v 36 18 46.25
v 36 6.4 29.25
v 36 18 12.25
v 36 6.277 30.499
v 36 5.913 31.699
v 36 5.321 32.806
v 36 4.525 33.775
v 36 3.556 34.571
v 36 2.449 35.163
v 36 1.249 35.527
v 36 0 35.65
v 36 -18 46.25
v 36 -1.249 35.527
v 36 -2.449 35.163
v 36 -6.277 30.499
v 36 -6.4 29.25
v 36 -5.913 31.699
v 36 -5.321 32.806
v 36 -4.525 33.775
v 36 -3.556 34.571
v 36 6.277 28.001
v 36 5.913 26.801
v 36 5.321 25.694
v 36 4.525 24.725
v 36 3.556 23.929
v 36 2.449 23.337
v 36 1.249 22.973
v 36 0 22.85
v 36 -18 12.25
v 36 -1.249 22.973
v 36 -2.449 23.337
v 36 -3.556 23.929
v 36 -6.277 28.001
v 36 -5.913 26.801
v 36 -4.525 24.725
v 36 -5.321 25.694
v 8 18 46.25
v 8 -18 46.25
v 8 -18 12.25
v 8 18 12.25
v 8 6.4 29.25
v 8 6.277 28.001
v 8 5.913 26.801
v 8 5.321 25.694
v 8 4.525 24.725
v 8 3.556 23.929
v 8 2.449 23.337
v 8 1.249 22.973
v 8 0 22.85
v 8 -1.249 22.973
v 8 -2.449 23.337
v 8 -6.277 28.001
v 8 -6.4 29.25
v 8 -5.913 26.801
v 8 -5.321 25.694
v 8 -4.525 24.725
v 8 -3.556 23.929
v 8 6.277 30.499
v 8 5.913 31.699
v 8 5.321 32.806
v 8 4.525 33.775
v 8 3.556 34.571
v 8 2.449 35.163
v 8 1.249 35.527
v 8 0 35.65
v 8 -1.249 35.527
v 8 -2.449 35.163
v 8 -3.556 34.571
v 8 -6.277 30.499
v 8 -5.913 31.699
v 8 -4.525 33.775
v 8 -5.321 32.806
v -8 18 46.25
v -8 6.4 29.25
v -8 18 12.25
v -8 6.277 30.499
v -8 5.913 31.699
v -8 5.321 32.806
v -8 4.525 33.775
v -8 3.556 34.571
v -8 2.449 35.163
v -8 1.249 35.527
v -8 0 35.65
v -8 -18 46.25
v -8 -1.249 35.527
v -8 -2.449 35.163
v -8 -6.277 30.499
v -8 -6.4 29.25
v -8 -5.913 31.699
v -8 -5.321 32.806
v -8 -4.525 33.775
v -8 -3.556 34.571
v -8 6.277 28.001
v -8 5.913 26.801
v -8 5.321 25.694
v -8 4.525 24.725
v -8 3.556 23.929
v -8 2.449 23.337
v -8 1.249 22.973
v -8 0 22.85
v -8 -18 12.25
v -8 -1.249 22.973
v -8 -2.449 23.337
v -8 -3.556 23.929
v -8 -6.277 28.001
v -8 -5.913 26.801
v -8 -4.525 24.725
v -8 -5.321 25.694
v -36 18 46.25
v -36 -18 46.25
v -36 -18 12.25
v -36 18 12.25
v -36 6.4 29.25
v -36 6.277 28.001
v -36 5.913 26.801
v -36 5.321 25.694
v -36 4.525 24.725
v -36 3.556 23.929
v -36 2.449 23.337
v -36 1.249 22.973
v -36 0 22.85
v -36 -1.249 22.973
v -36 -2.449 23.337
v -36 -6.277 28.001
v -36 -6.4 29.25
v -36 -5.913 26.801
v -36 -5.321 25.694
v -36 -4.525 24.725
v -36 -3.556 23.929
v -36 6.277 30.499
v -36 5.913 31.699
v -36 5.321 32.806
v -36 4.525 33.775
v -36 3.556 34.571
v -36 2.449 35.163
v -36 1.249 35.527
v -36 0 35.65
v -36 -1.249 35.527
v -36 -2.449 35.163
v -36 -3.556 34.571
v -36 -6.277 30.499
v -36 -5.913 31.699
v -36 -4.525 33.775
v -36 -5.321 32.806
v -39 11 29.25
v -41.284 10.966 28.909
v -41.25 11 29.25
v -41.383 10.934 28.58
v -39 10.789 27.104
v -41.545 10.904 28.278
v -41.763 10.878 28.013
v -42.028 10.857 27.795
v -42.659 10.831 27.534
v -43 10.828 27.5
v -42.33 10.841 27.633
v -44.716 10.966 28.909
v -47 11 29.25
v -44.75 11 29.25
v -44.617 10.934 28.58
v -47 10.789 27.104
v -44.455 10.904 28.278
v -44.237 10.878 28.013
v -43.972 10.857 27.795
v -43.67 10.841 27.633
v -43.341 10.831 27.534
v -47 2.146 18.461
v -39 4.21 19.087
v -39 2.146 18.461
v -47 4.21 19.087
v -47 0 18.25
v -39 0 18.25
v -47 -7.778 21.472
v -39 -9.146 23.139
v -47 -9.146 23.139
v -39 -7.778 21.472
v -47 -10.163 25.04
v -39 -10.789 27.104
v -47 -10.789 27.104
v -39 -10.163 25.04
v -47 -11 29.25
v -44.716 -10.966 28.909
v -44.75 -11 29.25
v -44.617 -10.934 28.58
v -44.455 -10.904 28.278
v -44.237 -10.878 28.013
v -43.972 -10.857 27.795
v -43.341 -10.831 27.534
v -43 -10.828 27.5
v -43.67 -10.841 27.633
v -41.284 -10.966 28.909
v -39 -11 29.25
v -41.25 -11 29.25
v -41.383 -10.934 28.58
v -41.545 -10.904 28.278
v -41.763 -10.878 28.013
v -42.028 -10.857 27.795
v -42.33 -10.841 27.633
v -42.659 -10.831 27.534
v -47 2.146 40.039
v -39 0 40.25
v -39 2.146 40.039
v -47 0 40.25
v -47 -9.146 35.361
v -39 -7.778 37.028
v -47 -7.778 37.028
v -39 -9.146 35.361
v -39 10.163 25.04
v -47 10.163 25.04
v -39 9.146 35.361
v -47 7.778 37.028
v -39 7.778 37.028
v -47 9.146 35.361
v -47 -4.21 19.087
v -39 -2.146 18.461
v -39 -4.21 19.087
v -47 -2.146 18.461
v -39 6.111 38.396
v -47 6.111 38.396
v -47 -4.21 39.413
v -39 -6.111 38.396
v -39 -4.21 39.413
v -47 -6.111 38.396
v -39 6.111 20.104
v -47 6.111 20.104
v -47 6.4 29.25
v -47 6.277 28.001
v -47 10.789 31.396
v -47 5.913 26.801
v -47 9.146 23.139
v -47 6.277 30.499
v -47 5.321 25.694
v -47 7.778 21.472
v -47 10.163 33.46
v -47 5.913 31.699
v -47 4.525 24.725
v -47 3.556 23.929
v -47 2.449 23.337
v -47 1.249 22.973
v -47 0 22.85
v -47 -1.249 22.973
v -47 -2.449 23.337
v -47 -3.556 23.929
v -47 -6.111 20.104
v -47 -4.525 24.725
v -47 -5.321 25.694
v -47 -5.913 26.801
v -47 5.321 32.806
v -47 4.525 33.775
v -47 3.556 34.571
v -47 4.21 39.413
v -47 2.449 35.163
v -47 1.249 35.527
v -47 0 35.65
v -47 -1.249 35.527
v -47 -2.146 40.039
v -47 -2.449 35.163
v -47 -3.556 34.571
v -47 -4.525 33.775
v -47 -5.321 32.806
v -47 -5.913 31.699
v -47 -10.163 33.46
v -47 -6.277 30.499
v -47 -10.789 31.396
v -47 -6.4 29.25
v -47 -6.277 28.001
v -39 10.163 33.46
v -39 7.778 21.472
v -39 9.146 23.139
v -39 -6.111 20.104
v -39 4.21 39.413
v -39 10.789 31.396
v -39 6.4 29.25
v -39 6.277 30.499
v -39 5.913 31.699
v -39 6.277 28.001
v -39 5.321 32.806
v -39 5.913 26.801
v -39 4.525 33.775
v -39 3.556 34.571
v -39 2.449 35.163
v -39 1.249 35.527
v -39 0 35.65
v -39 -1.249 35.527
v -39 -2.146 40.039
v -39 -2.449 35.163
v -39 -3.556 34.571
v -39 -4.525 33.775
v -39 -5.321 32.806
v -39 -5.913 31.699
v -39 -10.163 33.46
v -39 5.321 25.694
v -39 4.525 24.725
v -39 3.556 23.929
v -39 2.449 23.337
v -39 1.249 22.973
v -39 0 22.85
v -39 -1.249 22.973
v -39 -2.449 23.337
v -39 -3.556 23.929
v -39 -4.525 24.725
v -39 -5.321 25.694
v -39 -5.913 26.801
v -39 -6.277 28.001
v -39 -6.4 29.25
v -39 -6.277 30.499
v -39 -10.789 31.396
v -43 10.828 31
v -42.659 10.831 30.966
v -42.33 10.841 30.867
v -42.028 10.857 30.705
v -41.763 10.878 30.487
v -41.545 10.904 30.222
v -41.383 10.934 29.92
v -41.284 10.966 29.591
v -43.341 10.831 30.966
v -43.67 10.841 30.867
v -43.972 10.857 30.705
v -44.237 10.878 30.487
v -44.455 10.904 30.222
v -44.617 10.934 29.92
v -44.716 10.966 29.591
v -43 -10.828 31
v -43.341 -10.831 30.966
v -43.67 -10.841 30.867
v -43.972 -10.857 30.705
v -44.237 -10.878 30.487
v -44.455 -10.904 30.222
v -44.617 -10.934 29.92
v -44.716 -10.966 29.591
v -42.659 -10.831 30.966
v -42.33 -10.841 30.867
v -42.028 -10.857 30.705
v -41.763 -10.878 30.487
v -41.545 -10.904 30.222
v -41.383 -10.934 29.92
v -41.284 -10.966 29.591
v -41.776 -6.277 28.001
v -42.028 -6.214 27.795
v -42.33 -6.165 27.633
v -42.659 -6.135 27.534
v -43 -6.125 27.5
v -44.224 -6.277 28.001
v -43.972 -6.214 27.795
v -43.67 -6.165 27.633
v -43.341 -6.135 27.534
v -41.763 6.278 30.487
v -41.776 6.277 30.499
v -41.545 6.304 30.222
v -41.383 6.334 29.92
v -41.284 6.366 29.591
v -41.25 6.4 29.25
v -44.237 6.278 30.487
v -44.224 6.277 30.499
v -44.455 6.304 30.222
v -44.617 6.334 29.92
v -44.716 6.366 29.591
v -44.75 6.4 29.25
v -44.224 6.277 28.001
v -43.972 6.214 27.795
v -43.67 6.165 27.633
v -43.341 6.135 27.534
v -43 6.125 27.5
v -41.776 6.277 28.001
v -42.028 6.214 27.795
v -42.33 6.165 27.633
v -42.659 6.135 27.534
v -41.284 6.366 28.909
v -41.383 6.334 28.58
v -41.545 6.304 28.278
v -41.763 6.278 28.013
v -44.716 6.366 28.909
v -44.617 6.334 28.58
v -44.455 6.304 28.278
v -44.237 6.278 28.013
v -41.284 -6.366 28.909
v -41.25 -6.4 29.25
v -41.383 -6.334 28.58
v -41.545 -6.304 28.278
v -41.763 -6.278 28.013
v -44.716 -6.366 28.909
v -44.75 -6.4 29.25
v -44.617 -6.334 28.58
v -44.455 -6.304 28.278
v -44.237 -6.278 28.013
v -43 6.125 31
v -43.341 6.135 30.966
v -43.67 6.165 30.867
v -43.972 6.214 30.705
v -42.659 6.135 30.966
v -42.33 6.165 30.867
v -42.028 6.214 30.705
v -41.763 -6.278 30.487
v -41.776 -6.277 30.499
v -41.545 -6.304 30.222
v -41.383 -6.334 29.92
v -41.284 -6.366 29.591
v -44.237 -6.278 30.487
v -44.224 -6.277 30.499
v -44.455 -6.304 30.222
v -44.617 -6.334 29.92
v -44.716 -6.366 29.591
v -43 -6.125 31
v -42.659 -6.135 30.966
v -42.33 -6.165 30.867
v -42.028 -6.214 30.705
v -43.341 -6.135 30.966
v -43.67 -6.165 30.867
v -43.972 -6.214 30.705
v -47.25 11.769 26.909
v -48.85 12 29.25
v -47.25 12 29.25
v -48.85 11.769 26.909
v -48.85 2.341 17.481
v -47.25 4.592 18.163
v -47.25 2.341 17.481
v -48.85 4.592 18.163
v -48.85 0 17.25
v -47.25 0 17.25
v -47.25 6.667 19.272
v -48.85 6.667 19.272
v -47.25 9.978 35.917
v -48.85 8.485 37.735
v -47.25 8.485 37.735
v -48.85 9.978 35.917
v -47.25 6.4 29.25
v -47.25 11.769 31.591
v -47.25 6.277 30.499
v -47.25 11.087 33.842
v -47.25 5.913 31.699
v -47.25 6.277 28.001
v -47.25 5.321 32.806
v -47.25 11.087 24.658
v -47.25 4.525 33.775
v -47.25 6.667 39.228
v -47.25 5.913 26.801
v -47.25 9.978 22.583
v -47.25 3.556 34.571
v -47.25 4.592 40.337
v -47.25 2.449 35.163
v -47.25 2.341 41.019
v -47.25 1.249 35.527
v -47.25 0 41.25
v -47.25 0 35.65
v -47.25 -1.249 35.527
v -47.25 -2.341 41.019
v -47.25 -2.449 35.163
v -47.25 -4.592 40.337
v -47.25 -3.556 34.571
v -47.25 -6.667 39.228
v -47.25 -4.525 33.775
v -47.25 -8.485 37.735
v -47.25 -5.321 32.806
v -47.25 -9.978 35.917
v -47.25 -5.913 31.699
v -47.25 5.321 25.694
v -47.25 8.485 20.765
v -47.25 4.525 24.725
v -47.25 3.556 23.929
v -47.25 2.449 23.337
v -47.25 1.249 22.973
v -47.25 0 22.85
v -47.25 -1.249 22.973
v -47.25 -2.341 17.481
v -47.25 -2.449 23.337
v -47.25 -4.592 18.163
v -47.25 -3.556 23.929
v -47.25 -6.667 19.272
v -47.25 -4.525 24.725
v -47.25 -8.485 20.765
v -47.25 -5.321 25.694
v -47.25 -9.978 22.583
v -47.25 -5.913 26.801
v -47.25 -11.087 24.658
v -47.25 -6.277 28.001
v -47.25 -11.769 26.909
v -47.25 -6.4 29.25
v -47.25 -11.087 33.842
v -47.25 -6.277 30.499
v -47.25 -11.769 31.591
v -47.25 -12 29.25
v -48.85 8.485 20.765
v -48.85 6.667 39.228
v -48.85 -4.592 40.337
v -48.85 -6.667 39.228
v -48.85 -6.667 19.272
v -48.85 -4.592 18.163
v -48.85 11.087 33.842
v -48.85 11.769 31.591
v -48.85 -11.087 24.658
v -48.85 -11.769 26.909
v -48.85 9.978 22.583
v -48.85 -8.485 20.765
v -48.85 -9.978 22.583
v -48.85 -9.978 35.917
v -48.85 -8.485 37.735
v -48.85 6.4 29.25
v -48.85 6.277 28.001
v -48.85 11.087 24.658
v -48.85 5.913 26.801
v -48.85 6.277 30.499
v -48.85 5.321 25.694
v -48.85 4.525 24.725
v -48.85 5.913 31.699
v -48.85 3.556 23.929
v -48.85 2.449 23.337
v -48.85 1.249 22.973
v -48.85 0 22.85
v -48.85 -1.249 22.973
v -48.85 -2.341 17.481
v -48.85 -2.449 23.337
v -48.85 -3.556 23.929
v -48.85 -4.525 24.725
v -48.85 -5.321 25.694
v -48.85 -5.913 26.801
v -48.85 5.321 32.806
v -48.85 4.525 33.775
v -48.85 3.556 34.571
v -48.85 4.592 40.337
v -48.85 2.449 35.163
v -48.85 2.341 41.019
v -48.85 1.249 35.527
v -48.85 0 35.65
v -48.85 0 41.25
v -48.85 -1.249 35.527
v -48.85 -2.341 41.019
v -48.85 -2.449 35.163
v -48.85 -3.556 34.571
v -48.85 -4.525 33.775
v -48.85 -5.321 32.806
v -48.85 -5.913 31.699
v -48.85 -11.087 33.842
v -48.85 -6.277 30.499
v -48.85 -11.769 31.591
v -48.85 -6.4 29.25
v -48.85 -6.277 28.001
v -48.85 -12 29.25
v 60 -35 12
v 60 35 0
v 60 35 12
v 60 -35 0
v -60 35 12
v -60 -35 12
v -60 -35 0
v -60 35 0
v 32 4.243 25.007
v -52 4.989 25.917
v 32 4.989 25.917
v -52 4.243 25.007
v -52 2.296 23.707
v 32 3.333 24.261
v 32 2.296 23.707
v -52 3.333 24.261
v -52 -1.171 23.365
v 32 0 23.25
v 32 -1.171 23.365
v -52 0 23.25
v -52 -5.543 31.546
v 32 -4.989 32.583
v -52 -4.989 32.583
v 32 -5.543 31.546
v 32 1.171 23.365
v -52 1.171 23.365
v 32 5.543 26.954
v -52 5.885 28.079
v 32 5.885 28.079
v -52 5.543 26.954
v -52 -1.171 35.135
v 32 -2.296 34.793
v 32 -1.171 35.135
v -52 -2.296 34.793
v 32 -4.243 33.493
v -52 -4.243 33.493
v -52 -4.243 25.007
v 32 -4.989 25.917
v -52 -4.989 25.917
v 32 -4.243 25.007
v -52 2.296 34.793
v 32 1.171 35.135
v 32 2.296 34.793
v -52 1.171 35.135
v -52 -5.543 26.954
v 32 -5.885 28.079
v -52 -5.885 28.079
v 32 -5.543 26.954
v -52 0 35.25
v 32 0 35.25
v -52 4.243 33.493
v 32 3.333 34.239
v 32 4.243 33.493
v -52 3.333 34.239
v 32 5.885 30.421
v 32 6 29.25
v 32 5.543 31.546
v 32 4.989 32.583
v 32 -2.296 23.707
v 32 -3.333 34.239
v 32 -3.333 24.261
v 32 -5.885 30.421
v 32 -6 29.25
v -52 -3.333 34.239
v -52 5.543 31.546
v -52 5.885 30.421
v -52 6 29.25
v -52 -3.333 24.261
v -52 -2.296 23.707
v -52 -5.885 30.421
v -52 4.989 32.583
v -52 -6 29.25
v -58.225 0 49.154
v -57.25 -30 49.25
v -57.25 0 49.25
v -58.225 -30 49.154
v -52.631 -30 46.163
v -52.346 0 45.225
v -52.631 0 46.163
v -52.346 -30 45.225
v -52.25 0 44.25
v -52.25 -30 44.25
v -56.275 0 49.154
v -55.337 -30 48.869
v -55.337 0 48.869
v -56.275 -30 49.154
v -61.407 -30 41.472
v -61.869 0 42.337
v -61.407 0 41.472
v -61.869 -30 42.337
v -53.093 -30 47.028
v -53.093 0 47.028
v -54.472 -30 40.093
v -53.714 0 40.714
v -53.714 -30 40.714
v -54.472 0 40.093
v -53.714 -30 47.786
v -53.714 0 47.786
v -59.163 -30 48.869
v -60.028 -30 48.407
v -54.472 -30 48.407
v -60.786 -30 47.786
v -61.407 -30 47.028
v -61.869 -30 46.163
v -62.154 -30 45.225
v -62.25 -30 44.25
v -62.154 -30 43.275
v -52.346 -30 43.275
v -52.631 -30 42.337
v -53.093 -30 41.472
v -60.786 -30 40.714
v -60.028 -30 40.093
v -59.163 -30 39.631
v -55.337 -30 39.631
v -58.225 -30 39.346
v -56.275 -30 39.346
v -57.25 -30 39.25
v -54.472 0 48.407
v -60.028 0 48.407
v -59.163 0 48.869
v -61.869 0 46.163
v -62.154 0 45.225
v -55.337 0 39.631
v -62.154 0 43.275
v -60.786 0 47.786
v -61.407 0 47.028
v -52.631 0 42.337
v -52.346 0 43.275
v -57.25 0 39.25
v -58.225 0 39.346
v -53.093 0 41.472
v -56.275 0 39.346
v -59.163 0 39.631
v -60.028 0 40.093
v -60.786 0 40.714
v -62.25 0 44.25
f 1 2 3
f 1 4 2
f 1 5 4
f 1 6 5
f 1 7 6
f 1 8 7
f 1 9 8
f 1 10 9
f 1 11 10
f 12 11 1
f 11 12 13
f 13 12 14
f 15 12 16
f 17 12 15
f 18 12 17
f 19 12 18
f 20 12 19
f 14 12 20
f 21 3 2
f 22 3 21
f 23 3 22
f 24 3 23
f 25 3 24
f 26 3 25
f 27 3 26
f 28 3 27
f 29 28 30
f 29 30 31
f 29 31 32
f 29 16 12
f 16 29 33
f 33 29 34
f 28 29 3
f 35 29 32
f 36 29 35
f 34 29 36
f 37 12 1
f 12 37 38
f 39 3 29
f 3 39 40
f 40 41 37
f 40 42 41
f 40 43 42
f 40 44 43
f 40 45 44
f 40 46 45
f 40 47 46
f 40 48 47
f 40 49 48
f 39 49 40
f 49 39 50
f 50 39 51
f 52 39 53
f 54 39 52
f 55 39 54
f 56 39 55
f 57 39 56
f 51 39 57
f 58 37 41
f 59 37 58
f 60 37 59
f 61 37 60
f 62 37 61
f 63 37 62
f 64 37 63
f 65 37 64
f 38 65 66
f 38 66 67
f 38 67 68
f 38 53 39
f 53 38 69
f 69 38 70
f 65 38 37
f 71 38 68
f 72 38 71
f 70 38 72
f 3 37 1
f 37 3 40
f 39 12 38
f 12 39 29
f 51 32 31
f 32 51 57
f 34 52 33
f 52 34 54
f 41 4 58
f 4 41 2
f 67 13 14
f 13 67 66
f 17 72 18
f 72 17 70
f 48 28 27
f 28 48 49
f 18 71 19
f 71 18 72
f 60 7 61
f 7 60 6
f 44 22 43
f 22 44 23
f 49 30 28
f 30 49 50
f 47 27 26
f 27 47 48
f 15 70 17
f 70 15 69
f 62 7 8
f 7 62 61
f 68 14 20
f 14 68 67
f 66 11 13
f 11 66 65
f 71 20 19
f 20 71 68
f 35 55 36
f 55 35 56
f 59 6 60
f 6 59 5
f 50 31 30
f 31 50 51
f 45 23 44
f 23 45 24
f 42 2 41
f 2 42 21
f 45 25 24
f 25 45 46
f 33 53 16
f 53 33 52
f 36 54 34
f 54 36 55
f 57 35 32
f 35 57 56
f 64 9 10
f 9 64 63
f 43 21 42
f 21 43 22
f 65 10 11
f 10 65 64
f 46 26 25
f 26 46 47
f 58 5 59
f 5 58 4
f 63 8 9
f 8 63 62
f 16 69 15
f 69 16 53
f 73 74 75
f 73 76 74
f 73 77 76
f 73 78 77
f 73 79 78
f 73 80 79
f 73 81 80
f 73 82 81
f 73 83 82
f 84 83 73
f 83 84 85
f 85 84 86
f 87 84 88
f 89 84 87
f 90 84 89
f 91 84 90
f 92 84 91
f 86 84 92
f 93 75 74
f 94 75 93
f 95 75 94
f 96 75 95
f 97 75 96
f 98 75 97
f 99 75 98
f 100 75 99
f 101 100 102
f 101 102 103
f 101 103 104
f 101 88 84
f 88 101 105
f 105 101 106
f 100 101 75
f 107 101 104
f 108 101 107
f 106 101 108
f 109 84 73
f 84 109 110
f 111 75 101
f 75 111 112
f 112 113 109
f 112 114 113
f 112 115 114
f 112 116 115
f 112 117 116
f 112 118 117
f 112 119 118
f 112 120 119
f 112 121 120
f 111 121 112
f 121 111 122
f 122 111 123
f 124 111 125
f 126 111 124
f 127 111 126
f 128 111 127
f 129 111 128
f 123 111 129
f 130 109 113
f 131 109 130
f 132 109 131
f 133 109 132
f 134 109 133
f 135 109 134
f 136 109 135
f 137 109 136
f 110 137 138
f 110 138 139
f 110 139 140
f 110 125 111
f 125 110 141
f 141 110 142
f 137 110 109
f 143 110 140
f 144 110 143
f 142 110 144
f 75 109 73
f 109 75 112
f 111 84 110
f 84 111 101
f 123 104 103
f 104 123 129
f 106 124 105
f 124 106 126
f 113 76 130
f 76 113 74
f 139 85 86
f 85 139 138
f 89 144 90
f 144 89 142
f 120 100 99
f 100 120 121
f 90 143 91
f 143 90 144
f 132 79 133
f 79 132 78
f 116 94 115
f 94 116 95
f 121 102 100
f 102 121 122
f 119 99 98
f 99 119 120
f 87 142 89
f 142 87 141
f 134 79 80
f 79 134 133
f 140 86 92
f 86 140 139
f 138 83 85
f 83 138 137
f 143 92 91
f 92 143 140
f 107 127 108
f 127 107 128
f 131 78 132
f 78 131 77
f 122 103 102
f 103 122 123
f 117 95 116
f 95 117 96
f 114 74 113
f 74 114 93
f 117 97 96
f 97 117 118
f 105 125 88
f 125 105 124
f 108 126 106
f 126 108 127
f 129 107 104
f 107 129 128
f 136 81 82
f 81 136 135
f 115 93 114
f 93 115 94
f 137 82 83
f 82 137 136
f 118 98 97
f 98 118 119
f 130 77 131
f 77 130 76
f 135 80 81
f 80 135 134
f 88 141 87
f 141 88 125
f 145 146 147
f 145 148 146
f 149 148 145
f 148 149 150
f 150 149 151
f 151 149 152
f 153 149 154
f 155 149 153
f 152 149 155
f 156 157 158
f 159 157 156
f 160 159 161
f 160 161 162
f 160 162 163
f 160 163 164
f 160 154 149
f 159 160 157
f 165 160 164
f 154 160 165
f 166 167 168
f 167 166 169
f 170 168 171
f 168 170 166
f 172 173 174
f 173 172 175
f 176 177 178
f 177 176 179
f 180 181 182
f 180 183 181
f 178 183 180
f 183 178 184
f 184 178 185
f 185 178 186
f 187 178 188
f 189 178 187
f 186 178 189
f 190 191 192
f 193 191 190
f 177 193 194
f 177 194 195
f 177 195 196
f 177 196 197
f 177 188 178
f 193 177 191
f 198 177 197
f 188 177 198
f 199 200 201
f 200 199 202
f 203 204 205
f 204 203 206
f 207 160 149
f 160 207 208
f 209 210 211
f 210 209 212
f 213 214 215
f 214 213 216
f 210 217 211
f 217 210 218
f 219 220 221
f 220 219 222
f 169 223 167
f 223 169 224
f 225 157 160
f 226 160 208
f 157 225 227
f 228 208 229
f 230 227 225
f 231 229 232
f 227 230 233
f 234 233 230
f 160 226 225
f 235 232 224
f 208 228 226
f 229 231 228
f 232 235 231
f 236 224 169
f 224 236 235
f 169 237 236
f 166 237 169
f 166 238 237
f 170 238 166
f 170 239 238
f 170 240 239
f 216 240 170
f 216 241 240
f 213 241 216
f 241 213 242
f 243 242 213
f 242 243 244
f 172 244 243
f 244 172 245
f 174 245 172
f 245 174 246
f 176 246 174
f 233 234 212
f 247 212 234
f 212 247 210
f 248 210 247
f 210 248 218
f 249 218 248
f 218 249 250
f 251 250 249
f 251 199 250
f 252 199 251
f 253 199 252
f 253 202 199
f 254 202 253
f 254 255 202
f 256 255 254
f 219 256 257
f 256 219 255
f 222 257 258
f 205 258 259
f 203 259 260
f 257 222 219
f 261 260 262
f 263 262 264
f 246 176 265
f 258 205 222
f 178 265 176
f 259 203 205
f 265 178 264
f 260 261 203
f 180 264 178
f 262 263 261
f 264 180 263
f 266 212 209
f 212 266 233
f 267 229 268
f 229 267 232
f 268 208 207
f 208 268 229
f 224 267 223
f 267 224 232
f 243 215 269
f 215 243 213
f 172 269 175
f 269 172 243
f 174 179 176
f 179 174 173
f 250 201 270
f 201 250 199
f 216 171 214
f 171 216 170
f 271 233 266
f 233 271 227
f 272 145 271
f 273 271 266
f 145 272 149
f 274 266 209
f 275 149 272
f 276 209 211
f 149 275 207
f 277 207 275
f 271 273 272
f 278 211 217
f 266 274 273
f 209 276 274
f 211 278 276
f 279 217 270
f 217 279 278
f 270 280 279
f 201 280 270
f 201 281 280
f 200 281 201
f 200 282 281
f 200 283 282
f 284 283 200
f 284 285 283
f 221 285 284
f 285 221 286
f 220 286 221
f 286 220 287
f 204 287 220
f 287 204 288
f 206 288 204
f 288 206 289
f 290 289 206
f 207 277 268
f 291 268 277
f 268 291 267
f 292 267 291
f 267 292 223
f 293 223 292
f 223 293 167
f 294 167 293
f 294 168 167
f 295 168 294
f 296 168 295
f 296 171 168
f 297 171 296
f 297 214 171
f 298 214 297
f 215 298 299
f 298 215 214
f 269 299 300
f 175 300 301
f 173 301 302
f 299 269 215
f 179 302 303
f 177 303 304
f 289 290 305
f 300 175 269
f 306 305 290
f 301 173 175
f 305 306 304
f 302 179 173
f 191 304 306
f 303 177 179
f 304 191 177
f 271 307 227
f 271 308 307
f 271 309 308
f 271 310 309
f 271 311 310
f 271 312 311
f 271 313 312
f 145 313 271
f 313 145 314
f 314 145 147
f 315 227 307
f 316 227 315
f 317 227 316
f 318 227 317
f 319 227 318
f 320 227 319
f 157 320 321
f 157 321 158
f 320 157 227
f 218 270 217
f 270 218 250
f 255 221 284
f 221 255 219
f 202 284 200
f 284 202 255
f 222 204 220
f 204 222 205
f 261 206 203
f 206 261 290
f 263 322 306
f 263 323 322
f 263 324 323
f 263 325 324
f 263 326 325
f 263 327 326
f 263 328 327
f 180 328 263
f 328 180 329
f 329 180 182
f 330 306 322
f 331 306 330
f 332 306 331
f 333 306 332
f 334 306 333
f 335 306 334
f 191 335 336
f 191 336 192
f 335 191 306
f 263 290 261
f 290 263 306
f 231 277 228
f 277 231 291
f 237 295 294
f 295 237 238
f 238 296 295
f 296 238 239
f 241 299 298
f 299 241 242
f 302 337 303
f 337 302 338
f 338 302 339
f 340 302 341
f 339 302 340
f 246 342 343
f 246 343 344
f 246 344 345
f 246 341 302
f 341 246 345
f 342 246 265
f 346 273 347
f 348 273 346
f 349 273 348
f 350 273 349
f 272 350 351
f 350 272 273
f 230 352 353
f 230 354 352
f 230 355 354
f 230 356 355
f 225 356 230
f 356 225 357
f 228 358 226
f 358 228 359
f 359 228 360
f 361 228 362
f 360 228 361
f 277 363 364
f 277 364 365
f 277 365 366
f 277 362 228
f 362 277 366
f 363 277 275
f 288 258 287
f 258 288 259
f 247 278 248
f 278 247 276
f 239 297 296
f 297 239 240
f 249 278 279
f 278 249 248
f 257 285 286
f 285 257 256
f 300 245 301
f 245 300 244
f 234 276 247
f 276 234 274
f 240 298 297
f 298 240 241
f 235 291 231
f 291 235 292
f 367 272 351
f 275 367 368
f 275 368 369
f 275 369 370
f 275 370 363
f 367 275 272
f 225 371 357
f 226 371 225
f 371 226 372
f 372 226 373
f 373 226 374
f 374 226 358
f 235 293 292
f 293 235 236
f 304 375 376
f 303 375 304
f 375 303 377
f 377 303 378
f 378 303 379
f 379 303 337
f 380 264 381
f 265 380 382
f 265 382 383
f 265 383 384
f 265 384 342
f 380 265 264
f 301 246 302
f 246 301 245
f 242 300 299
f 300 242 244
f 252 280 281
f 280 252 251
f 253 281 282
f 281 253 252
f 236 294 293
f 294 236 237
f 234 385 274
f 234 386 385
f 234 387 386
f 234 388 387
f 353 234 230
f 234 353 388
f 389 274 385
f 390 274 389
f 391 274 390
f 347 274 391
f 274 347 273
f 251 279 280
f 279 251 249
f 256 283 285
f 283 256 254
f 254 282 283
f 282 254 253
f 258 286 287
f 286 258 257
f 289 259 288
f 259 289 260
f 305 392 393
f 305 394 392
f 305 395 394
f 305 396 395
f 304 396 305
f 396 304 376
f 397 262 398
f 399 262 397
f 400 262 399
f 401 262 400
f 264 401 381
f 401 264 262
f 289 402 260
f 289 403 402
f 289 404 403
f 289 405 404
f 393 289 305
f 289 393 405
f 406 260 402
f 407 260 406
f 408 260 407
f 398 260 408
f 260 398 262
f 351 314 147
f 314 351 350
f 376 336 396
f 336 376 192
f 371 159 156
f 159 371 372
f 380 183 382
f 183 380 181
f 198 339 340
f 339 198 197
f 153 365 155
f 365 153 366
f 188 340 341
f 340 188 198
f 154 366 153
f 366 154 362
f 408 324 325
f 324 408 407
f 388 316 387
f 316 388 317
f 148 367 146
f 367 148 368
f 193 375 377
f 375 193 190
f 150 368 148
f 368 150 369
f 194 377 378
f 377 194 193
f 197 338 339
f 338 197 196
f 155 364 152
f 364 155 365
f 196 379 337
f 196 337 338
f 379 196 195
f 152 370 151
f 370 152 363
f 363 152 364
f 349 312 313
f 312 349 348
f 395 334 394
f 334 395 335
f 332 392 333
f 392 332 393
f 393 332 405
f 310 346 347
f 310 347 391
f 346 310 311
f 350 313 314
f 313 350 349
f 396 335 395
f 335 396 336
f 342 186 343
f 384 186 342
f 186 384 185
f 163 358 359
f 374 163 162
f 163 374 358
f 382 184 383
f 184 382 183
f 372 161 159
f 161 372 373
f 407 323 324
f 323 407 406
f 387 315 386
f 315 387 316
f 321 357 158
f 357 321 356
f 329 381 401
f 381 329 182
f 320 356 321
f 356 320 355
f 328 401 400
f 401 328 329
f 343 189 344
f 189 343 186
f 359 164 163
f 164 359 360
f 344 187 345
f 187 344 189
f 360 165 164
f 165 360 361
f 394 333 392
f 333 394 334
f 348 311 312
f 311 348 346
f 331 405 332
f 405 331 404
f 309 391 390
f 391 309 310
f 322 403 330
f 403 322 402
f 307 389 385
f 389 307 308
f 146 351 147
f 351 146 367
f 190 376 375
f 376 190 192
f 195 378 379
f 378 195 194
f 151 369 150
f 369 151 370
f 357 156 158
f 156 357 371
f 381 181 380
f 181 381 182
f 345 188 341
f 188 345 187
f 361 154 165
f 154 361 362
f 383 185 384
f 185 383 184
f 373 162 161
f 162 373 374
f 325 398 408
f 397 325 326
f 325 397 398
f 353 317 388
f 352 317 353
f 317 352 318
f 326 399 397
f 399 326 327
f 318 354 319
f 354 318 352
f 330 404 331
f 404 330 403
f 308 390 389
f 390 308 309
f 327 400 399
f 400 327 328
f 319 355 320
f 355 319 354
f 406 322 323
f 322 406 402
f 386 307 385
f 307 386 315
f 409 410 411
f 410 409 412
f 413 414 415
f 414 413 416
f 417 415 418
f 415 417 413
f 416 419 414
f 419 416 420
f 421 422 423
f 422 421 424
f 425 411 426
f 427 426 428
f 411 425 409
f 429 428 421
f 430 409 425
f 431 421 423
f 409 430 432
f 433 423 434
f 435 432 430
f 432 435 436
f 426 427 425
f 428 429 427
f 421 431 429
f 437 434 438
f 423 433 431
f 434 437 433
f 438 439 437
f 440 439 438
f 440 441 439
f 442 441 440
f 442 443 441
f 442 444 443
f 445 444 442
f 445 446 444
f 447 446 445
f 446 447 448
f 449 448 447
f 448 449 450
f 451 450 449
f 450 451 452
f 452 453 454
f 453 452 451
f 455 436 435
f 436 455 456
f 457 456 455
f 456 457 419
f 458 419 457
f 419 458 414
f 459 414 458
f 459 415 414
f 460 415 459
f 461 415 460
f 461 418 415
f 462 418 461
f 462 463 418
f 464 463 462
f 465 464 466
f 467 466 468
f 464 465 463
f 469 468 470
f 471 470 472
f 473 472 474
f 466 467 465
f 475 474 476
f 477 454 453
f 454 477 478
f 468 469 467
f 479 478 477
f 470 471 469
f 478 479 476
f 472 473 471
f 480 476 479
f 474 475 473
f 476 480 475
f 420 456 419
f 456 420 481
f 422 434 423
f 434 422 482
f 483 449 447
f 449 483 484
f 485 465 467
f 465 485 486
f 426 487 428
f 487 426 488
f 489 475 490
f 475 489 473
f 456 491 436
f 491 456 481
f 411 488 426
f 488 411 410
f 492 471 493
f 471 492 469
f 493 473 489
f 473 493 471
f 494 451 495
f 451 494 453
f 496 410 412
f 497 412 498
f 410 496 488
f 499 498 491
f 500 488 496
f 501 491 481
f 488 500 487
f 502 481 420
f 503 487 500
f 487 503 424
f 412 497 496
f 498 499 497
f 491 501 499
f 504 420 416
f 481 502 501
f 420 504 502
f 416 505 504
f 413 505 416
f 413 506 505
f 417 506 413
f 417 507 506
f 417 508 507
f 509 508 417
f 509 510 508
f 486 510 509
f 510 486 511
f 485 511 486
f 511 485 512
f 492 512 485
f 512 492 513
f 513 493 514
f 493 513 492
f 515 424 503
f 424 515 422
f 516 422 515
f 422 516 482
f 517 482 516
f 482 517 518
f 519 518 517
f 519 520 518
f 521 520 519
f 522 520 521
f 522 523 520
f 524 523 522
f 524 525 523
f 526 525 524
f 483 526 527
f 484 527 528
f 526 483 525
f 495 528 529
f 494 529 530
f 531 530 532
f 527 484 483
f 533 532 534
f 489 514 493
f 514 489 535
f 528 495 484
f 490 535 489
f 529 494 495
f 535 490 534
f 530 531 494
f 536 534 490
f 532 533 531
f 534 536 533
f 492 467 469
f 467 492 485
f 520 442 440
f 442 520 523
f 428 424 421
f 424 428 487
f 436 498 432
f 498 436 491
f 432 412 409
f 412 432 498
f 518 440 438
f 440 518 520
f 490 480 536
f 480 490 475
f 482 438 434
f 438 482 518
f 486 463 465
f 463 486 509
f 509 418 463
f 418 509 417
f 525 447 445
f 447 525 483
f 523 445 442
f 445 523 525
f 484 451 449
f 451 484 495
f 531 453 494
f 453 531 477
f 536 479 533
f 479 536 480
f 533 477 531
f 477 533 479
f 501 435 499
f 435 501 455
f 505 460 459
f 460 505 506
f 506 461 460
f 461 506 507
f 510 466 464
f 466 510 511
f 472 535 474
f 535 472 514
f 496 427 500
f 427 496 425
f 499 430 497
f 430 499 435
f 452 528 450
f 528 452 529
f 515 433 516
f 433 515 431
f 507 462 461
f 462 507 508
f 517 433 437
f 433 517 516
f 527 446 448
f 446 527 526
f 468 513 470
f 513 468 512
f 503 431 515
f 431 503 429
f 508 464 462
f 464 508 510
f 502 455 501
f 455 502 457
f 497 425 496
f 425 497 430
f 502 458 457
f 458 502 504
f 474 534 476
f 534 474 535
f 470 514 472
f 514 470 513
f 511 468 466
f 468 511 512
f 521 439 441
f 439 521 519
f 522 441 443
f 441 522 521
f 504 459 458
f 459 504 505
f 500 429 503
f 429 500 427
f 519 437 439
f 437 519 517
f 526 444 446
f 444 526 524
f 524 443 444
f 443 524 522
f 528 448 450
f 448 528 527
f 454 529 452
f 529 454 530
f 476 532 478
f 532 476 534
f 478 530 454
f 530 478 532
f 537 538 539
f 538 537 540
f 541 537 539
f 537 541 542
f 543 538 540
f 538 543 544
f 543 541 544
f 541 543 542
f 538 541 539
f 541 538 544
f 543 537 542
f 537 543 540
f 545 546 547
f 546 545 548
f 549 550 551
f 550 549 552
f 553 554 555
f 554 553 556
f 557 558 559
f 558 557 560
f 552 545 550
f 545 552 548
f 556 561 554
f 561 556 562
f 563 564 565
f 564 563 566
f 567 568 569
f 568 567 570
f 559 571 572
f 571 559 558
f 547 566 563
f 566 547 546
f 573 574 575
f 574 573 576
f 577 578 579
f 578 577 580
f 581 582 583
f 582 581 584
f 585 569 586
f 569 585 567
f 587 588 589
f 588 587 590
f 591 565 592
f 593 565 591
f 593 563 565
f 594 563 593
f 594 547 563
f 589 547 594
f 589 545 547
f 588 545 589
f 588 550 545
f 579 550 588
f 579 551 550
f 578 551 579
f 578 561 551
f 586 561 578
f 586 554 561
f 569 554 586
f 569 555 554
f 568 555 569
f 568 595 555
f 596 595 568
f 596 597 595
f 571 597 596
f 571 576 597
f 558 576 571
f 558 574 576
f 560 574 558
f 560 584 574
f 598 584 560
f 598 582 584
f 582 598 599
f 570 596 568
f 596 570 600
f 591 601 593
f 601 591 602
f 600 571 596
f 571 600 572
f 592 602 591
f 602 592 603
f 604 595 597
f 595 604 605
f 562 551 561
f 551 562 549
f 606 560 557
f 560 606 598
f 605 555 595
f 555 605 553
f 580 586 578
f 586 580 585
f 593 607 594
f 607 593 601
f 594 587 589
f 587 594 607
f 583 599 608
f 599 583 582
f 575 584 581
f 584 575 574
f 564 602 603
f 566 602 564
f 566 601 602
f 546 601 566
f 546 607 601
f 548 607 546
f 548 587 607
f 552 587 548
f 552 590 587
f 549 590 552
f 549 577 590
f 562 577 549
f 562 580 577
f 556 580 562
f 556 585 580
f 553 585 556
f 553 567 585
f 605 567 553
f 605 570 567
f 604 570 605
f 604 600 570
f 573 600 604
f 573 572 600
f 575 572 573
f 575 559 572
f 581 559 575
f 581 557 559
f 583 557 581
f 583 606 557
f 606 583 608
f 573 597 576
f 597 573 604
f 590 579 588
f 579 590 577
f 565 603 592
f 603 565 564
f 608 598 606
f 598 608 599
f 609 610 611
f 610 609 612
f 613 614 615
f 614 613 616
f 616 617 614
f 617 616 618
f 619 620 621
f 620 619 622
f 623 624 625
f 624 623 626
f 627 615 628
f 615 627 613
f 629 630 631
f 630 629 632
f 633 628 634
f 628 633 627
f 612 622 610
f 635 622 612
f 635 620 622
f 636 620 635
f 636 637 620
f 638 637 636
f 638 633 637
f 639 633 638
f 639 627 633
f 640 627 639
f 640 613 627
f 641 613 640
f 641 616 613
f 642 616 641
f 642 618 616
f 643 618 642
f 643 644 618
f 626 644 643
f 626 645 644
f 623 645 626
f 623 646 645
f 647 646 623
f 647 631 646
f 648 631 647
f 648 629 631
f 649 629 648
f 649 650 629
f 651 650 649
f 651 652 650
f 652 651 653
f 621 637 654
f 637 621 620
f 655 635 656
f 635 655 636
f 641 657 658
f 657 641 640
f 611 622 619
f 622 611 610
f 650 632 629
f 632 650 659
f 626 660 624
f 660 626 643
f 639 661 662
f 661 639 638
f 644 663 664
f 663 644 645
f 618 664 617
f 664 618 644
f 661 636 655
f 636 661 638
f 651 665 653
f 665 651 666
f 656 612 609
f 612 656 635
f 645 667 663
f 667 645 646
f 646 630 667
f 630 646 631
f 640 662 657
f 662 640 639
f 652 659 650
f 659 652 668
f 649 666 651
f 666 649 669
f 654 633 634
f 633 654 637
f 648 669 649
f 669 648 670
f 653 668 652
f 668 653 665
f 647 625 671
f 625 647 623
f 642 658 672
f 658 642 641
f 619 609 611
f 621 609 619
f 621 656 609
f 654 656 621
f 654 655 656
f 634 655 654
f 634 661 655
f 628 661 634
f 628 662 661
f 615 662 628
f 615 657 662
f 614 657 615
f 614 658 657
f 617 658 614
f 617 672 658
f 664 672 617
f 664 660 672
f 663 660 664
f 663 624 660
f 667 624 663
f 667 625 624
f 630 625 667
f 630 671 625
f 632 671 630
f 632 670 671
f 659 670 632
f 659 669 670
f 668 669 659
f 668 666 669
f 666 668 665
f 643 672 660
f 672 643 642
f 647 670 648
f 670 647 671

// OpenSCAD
$fn = 32;

// ------------------------------------------------------------------------
// Machine vise: screw d12, jaws 28 x 34 mm
// Every part is its own module, assembly() places every instance.
// ------------------------------------------------------------------------

// --- part 1 ---
module vise_bed() {
  difference() {
    translate([-60, -35, 0]) cube([120, 70, 12]);
  }
}

// --- part 2 ---
module vise_jaw() {
  difference() {
    translate([-14, -18, 0]) cube([28, 36, 34]);
    translate([0, 0, 17]) rotate([0, 90, 0]) cylinder(h = 30, d = 12.8, center = true);
  }
}

// --- part 3 ---
module vise_screw() {
  translate([0, 0, -42]) cylinder(h = 84, d = 12);
}

// --- part 4 ---
module screw_collar() {
  difference() {
    cylinder(h = 8, d = 22);
    translate([0, 0, -1]) cylinder(h = 10, d = 12.8);
    translate([0, 0, 4]) rotate([90, 0, 0]) cylinder(h = 24, d = 3.5, center = true);
  }
}

// --- part 5 ---
module screw_washer() {
  difference() {
      translate([0, 0, 0]) cylinder(h = 1.6, d = 24);
      translate([0, 0, -1]) cylinder(h = 3.6, d = 12.8);
    }
}

// --- part 6 ---
module vise_handle() {
  cylinder(h = 30, d = 10);
}

// --- assembly ---
module assembly() {
  color([0.80, 0.24, 0.20]) translate([0, 0, 0]) rotate([0, 0, 0]) vise_bed();
  color([0.20, 0.45, 0.75]) translate([22, 0, 12.25]) rotate([0, 0, 0]) vise_jaw();
  color([0.25, 0.62, 0.32]) translate([-22, 0, 12.25]) rotate([0, 0, 0]) vise_jaw();
  color([0.92, 0.70, 0.18]) translate([-10, 0, 29.25]) rotate([0, 90, 0]) vise_screw();
  color([0.58, 0.35, 0.70]) translate([-47, 0, 29.25]) rotate([0, 90, 0]) screw_collar();
  color([0.16, 0.66, 0.66]) translate([-48.85, 0, 29.25]) rotate([0, 90, 0]) screw_washer();
  color([0.85, 0.48, 0.18]) translate([-57.25, 0, 44.25]) rotate([90, 0, 0]) vise_handle();
}

assembly();
